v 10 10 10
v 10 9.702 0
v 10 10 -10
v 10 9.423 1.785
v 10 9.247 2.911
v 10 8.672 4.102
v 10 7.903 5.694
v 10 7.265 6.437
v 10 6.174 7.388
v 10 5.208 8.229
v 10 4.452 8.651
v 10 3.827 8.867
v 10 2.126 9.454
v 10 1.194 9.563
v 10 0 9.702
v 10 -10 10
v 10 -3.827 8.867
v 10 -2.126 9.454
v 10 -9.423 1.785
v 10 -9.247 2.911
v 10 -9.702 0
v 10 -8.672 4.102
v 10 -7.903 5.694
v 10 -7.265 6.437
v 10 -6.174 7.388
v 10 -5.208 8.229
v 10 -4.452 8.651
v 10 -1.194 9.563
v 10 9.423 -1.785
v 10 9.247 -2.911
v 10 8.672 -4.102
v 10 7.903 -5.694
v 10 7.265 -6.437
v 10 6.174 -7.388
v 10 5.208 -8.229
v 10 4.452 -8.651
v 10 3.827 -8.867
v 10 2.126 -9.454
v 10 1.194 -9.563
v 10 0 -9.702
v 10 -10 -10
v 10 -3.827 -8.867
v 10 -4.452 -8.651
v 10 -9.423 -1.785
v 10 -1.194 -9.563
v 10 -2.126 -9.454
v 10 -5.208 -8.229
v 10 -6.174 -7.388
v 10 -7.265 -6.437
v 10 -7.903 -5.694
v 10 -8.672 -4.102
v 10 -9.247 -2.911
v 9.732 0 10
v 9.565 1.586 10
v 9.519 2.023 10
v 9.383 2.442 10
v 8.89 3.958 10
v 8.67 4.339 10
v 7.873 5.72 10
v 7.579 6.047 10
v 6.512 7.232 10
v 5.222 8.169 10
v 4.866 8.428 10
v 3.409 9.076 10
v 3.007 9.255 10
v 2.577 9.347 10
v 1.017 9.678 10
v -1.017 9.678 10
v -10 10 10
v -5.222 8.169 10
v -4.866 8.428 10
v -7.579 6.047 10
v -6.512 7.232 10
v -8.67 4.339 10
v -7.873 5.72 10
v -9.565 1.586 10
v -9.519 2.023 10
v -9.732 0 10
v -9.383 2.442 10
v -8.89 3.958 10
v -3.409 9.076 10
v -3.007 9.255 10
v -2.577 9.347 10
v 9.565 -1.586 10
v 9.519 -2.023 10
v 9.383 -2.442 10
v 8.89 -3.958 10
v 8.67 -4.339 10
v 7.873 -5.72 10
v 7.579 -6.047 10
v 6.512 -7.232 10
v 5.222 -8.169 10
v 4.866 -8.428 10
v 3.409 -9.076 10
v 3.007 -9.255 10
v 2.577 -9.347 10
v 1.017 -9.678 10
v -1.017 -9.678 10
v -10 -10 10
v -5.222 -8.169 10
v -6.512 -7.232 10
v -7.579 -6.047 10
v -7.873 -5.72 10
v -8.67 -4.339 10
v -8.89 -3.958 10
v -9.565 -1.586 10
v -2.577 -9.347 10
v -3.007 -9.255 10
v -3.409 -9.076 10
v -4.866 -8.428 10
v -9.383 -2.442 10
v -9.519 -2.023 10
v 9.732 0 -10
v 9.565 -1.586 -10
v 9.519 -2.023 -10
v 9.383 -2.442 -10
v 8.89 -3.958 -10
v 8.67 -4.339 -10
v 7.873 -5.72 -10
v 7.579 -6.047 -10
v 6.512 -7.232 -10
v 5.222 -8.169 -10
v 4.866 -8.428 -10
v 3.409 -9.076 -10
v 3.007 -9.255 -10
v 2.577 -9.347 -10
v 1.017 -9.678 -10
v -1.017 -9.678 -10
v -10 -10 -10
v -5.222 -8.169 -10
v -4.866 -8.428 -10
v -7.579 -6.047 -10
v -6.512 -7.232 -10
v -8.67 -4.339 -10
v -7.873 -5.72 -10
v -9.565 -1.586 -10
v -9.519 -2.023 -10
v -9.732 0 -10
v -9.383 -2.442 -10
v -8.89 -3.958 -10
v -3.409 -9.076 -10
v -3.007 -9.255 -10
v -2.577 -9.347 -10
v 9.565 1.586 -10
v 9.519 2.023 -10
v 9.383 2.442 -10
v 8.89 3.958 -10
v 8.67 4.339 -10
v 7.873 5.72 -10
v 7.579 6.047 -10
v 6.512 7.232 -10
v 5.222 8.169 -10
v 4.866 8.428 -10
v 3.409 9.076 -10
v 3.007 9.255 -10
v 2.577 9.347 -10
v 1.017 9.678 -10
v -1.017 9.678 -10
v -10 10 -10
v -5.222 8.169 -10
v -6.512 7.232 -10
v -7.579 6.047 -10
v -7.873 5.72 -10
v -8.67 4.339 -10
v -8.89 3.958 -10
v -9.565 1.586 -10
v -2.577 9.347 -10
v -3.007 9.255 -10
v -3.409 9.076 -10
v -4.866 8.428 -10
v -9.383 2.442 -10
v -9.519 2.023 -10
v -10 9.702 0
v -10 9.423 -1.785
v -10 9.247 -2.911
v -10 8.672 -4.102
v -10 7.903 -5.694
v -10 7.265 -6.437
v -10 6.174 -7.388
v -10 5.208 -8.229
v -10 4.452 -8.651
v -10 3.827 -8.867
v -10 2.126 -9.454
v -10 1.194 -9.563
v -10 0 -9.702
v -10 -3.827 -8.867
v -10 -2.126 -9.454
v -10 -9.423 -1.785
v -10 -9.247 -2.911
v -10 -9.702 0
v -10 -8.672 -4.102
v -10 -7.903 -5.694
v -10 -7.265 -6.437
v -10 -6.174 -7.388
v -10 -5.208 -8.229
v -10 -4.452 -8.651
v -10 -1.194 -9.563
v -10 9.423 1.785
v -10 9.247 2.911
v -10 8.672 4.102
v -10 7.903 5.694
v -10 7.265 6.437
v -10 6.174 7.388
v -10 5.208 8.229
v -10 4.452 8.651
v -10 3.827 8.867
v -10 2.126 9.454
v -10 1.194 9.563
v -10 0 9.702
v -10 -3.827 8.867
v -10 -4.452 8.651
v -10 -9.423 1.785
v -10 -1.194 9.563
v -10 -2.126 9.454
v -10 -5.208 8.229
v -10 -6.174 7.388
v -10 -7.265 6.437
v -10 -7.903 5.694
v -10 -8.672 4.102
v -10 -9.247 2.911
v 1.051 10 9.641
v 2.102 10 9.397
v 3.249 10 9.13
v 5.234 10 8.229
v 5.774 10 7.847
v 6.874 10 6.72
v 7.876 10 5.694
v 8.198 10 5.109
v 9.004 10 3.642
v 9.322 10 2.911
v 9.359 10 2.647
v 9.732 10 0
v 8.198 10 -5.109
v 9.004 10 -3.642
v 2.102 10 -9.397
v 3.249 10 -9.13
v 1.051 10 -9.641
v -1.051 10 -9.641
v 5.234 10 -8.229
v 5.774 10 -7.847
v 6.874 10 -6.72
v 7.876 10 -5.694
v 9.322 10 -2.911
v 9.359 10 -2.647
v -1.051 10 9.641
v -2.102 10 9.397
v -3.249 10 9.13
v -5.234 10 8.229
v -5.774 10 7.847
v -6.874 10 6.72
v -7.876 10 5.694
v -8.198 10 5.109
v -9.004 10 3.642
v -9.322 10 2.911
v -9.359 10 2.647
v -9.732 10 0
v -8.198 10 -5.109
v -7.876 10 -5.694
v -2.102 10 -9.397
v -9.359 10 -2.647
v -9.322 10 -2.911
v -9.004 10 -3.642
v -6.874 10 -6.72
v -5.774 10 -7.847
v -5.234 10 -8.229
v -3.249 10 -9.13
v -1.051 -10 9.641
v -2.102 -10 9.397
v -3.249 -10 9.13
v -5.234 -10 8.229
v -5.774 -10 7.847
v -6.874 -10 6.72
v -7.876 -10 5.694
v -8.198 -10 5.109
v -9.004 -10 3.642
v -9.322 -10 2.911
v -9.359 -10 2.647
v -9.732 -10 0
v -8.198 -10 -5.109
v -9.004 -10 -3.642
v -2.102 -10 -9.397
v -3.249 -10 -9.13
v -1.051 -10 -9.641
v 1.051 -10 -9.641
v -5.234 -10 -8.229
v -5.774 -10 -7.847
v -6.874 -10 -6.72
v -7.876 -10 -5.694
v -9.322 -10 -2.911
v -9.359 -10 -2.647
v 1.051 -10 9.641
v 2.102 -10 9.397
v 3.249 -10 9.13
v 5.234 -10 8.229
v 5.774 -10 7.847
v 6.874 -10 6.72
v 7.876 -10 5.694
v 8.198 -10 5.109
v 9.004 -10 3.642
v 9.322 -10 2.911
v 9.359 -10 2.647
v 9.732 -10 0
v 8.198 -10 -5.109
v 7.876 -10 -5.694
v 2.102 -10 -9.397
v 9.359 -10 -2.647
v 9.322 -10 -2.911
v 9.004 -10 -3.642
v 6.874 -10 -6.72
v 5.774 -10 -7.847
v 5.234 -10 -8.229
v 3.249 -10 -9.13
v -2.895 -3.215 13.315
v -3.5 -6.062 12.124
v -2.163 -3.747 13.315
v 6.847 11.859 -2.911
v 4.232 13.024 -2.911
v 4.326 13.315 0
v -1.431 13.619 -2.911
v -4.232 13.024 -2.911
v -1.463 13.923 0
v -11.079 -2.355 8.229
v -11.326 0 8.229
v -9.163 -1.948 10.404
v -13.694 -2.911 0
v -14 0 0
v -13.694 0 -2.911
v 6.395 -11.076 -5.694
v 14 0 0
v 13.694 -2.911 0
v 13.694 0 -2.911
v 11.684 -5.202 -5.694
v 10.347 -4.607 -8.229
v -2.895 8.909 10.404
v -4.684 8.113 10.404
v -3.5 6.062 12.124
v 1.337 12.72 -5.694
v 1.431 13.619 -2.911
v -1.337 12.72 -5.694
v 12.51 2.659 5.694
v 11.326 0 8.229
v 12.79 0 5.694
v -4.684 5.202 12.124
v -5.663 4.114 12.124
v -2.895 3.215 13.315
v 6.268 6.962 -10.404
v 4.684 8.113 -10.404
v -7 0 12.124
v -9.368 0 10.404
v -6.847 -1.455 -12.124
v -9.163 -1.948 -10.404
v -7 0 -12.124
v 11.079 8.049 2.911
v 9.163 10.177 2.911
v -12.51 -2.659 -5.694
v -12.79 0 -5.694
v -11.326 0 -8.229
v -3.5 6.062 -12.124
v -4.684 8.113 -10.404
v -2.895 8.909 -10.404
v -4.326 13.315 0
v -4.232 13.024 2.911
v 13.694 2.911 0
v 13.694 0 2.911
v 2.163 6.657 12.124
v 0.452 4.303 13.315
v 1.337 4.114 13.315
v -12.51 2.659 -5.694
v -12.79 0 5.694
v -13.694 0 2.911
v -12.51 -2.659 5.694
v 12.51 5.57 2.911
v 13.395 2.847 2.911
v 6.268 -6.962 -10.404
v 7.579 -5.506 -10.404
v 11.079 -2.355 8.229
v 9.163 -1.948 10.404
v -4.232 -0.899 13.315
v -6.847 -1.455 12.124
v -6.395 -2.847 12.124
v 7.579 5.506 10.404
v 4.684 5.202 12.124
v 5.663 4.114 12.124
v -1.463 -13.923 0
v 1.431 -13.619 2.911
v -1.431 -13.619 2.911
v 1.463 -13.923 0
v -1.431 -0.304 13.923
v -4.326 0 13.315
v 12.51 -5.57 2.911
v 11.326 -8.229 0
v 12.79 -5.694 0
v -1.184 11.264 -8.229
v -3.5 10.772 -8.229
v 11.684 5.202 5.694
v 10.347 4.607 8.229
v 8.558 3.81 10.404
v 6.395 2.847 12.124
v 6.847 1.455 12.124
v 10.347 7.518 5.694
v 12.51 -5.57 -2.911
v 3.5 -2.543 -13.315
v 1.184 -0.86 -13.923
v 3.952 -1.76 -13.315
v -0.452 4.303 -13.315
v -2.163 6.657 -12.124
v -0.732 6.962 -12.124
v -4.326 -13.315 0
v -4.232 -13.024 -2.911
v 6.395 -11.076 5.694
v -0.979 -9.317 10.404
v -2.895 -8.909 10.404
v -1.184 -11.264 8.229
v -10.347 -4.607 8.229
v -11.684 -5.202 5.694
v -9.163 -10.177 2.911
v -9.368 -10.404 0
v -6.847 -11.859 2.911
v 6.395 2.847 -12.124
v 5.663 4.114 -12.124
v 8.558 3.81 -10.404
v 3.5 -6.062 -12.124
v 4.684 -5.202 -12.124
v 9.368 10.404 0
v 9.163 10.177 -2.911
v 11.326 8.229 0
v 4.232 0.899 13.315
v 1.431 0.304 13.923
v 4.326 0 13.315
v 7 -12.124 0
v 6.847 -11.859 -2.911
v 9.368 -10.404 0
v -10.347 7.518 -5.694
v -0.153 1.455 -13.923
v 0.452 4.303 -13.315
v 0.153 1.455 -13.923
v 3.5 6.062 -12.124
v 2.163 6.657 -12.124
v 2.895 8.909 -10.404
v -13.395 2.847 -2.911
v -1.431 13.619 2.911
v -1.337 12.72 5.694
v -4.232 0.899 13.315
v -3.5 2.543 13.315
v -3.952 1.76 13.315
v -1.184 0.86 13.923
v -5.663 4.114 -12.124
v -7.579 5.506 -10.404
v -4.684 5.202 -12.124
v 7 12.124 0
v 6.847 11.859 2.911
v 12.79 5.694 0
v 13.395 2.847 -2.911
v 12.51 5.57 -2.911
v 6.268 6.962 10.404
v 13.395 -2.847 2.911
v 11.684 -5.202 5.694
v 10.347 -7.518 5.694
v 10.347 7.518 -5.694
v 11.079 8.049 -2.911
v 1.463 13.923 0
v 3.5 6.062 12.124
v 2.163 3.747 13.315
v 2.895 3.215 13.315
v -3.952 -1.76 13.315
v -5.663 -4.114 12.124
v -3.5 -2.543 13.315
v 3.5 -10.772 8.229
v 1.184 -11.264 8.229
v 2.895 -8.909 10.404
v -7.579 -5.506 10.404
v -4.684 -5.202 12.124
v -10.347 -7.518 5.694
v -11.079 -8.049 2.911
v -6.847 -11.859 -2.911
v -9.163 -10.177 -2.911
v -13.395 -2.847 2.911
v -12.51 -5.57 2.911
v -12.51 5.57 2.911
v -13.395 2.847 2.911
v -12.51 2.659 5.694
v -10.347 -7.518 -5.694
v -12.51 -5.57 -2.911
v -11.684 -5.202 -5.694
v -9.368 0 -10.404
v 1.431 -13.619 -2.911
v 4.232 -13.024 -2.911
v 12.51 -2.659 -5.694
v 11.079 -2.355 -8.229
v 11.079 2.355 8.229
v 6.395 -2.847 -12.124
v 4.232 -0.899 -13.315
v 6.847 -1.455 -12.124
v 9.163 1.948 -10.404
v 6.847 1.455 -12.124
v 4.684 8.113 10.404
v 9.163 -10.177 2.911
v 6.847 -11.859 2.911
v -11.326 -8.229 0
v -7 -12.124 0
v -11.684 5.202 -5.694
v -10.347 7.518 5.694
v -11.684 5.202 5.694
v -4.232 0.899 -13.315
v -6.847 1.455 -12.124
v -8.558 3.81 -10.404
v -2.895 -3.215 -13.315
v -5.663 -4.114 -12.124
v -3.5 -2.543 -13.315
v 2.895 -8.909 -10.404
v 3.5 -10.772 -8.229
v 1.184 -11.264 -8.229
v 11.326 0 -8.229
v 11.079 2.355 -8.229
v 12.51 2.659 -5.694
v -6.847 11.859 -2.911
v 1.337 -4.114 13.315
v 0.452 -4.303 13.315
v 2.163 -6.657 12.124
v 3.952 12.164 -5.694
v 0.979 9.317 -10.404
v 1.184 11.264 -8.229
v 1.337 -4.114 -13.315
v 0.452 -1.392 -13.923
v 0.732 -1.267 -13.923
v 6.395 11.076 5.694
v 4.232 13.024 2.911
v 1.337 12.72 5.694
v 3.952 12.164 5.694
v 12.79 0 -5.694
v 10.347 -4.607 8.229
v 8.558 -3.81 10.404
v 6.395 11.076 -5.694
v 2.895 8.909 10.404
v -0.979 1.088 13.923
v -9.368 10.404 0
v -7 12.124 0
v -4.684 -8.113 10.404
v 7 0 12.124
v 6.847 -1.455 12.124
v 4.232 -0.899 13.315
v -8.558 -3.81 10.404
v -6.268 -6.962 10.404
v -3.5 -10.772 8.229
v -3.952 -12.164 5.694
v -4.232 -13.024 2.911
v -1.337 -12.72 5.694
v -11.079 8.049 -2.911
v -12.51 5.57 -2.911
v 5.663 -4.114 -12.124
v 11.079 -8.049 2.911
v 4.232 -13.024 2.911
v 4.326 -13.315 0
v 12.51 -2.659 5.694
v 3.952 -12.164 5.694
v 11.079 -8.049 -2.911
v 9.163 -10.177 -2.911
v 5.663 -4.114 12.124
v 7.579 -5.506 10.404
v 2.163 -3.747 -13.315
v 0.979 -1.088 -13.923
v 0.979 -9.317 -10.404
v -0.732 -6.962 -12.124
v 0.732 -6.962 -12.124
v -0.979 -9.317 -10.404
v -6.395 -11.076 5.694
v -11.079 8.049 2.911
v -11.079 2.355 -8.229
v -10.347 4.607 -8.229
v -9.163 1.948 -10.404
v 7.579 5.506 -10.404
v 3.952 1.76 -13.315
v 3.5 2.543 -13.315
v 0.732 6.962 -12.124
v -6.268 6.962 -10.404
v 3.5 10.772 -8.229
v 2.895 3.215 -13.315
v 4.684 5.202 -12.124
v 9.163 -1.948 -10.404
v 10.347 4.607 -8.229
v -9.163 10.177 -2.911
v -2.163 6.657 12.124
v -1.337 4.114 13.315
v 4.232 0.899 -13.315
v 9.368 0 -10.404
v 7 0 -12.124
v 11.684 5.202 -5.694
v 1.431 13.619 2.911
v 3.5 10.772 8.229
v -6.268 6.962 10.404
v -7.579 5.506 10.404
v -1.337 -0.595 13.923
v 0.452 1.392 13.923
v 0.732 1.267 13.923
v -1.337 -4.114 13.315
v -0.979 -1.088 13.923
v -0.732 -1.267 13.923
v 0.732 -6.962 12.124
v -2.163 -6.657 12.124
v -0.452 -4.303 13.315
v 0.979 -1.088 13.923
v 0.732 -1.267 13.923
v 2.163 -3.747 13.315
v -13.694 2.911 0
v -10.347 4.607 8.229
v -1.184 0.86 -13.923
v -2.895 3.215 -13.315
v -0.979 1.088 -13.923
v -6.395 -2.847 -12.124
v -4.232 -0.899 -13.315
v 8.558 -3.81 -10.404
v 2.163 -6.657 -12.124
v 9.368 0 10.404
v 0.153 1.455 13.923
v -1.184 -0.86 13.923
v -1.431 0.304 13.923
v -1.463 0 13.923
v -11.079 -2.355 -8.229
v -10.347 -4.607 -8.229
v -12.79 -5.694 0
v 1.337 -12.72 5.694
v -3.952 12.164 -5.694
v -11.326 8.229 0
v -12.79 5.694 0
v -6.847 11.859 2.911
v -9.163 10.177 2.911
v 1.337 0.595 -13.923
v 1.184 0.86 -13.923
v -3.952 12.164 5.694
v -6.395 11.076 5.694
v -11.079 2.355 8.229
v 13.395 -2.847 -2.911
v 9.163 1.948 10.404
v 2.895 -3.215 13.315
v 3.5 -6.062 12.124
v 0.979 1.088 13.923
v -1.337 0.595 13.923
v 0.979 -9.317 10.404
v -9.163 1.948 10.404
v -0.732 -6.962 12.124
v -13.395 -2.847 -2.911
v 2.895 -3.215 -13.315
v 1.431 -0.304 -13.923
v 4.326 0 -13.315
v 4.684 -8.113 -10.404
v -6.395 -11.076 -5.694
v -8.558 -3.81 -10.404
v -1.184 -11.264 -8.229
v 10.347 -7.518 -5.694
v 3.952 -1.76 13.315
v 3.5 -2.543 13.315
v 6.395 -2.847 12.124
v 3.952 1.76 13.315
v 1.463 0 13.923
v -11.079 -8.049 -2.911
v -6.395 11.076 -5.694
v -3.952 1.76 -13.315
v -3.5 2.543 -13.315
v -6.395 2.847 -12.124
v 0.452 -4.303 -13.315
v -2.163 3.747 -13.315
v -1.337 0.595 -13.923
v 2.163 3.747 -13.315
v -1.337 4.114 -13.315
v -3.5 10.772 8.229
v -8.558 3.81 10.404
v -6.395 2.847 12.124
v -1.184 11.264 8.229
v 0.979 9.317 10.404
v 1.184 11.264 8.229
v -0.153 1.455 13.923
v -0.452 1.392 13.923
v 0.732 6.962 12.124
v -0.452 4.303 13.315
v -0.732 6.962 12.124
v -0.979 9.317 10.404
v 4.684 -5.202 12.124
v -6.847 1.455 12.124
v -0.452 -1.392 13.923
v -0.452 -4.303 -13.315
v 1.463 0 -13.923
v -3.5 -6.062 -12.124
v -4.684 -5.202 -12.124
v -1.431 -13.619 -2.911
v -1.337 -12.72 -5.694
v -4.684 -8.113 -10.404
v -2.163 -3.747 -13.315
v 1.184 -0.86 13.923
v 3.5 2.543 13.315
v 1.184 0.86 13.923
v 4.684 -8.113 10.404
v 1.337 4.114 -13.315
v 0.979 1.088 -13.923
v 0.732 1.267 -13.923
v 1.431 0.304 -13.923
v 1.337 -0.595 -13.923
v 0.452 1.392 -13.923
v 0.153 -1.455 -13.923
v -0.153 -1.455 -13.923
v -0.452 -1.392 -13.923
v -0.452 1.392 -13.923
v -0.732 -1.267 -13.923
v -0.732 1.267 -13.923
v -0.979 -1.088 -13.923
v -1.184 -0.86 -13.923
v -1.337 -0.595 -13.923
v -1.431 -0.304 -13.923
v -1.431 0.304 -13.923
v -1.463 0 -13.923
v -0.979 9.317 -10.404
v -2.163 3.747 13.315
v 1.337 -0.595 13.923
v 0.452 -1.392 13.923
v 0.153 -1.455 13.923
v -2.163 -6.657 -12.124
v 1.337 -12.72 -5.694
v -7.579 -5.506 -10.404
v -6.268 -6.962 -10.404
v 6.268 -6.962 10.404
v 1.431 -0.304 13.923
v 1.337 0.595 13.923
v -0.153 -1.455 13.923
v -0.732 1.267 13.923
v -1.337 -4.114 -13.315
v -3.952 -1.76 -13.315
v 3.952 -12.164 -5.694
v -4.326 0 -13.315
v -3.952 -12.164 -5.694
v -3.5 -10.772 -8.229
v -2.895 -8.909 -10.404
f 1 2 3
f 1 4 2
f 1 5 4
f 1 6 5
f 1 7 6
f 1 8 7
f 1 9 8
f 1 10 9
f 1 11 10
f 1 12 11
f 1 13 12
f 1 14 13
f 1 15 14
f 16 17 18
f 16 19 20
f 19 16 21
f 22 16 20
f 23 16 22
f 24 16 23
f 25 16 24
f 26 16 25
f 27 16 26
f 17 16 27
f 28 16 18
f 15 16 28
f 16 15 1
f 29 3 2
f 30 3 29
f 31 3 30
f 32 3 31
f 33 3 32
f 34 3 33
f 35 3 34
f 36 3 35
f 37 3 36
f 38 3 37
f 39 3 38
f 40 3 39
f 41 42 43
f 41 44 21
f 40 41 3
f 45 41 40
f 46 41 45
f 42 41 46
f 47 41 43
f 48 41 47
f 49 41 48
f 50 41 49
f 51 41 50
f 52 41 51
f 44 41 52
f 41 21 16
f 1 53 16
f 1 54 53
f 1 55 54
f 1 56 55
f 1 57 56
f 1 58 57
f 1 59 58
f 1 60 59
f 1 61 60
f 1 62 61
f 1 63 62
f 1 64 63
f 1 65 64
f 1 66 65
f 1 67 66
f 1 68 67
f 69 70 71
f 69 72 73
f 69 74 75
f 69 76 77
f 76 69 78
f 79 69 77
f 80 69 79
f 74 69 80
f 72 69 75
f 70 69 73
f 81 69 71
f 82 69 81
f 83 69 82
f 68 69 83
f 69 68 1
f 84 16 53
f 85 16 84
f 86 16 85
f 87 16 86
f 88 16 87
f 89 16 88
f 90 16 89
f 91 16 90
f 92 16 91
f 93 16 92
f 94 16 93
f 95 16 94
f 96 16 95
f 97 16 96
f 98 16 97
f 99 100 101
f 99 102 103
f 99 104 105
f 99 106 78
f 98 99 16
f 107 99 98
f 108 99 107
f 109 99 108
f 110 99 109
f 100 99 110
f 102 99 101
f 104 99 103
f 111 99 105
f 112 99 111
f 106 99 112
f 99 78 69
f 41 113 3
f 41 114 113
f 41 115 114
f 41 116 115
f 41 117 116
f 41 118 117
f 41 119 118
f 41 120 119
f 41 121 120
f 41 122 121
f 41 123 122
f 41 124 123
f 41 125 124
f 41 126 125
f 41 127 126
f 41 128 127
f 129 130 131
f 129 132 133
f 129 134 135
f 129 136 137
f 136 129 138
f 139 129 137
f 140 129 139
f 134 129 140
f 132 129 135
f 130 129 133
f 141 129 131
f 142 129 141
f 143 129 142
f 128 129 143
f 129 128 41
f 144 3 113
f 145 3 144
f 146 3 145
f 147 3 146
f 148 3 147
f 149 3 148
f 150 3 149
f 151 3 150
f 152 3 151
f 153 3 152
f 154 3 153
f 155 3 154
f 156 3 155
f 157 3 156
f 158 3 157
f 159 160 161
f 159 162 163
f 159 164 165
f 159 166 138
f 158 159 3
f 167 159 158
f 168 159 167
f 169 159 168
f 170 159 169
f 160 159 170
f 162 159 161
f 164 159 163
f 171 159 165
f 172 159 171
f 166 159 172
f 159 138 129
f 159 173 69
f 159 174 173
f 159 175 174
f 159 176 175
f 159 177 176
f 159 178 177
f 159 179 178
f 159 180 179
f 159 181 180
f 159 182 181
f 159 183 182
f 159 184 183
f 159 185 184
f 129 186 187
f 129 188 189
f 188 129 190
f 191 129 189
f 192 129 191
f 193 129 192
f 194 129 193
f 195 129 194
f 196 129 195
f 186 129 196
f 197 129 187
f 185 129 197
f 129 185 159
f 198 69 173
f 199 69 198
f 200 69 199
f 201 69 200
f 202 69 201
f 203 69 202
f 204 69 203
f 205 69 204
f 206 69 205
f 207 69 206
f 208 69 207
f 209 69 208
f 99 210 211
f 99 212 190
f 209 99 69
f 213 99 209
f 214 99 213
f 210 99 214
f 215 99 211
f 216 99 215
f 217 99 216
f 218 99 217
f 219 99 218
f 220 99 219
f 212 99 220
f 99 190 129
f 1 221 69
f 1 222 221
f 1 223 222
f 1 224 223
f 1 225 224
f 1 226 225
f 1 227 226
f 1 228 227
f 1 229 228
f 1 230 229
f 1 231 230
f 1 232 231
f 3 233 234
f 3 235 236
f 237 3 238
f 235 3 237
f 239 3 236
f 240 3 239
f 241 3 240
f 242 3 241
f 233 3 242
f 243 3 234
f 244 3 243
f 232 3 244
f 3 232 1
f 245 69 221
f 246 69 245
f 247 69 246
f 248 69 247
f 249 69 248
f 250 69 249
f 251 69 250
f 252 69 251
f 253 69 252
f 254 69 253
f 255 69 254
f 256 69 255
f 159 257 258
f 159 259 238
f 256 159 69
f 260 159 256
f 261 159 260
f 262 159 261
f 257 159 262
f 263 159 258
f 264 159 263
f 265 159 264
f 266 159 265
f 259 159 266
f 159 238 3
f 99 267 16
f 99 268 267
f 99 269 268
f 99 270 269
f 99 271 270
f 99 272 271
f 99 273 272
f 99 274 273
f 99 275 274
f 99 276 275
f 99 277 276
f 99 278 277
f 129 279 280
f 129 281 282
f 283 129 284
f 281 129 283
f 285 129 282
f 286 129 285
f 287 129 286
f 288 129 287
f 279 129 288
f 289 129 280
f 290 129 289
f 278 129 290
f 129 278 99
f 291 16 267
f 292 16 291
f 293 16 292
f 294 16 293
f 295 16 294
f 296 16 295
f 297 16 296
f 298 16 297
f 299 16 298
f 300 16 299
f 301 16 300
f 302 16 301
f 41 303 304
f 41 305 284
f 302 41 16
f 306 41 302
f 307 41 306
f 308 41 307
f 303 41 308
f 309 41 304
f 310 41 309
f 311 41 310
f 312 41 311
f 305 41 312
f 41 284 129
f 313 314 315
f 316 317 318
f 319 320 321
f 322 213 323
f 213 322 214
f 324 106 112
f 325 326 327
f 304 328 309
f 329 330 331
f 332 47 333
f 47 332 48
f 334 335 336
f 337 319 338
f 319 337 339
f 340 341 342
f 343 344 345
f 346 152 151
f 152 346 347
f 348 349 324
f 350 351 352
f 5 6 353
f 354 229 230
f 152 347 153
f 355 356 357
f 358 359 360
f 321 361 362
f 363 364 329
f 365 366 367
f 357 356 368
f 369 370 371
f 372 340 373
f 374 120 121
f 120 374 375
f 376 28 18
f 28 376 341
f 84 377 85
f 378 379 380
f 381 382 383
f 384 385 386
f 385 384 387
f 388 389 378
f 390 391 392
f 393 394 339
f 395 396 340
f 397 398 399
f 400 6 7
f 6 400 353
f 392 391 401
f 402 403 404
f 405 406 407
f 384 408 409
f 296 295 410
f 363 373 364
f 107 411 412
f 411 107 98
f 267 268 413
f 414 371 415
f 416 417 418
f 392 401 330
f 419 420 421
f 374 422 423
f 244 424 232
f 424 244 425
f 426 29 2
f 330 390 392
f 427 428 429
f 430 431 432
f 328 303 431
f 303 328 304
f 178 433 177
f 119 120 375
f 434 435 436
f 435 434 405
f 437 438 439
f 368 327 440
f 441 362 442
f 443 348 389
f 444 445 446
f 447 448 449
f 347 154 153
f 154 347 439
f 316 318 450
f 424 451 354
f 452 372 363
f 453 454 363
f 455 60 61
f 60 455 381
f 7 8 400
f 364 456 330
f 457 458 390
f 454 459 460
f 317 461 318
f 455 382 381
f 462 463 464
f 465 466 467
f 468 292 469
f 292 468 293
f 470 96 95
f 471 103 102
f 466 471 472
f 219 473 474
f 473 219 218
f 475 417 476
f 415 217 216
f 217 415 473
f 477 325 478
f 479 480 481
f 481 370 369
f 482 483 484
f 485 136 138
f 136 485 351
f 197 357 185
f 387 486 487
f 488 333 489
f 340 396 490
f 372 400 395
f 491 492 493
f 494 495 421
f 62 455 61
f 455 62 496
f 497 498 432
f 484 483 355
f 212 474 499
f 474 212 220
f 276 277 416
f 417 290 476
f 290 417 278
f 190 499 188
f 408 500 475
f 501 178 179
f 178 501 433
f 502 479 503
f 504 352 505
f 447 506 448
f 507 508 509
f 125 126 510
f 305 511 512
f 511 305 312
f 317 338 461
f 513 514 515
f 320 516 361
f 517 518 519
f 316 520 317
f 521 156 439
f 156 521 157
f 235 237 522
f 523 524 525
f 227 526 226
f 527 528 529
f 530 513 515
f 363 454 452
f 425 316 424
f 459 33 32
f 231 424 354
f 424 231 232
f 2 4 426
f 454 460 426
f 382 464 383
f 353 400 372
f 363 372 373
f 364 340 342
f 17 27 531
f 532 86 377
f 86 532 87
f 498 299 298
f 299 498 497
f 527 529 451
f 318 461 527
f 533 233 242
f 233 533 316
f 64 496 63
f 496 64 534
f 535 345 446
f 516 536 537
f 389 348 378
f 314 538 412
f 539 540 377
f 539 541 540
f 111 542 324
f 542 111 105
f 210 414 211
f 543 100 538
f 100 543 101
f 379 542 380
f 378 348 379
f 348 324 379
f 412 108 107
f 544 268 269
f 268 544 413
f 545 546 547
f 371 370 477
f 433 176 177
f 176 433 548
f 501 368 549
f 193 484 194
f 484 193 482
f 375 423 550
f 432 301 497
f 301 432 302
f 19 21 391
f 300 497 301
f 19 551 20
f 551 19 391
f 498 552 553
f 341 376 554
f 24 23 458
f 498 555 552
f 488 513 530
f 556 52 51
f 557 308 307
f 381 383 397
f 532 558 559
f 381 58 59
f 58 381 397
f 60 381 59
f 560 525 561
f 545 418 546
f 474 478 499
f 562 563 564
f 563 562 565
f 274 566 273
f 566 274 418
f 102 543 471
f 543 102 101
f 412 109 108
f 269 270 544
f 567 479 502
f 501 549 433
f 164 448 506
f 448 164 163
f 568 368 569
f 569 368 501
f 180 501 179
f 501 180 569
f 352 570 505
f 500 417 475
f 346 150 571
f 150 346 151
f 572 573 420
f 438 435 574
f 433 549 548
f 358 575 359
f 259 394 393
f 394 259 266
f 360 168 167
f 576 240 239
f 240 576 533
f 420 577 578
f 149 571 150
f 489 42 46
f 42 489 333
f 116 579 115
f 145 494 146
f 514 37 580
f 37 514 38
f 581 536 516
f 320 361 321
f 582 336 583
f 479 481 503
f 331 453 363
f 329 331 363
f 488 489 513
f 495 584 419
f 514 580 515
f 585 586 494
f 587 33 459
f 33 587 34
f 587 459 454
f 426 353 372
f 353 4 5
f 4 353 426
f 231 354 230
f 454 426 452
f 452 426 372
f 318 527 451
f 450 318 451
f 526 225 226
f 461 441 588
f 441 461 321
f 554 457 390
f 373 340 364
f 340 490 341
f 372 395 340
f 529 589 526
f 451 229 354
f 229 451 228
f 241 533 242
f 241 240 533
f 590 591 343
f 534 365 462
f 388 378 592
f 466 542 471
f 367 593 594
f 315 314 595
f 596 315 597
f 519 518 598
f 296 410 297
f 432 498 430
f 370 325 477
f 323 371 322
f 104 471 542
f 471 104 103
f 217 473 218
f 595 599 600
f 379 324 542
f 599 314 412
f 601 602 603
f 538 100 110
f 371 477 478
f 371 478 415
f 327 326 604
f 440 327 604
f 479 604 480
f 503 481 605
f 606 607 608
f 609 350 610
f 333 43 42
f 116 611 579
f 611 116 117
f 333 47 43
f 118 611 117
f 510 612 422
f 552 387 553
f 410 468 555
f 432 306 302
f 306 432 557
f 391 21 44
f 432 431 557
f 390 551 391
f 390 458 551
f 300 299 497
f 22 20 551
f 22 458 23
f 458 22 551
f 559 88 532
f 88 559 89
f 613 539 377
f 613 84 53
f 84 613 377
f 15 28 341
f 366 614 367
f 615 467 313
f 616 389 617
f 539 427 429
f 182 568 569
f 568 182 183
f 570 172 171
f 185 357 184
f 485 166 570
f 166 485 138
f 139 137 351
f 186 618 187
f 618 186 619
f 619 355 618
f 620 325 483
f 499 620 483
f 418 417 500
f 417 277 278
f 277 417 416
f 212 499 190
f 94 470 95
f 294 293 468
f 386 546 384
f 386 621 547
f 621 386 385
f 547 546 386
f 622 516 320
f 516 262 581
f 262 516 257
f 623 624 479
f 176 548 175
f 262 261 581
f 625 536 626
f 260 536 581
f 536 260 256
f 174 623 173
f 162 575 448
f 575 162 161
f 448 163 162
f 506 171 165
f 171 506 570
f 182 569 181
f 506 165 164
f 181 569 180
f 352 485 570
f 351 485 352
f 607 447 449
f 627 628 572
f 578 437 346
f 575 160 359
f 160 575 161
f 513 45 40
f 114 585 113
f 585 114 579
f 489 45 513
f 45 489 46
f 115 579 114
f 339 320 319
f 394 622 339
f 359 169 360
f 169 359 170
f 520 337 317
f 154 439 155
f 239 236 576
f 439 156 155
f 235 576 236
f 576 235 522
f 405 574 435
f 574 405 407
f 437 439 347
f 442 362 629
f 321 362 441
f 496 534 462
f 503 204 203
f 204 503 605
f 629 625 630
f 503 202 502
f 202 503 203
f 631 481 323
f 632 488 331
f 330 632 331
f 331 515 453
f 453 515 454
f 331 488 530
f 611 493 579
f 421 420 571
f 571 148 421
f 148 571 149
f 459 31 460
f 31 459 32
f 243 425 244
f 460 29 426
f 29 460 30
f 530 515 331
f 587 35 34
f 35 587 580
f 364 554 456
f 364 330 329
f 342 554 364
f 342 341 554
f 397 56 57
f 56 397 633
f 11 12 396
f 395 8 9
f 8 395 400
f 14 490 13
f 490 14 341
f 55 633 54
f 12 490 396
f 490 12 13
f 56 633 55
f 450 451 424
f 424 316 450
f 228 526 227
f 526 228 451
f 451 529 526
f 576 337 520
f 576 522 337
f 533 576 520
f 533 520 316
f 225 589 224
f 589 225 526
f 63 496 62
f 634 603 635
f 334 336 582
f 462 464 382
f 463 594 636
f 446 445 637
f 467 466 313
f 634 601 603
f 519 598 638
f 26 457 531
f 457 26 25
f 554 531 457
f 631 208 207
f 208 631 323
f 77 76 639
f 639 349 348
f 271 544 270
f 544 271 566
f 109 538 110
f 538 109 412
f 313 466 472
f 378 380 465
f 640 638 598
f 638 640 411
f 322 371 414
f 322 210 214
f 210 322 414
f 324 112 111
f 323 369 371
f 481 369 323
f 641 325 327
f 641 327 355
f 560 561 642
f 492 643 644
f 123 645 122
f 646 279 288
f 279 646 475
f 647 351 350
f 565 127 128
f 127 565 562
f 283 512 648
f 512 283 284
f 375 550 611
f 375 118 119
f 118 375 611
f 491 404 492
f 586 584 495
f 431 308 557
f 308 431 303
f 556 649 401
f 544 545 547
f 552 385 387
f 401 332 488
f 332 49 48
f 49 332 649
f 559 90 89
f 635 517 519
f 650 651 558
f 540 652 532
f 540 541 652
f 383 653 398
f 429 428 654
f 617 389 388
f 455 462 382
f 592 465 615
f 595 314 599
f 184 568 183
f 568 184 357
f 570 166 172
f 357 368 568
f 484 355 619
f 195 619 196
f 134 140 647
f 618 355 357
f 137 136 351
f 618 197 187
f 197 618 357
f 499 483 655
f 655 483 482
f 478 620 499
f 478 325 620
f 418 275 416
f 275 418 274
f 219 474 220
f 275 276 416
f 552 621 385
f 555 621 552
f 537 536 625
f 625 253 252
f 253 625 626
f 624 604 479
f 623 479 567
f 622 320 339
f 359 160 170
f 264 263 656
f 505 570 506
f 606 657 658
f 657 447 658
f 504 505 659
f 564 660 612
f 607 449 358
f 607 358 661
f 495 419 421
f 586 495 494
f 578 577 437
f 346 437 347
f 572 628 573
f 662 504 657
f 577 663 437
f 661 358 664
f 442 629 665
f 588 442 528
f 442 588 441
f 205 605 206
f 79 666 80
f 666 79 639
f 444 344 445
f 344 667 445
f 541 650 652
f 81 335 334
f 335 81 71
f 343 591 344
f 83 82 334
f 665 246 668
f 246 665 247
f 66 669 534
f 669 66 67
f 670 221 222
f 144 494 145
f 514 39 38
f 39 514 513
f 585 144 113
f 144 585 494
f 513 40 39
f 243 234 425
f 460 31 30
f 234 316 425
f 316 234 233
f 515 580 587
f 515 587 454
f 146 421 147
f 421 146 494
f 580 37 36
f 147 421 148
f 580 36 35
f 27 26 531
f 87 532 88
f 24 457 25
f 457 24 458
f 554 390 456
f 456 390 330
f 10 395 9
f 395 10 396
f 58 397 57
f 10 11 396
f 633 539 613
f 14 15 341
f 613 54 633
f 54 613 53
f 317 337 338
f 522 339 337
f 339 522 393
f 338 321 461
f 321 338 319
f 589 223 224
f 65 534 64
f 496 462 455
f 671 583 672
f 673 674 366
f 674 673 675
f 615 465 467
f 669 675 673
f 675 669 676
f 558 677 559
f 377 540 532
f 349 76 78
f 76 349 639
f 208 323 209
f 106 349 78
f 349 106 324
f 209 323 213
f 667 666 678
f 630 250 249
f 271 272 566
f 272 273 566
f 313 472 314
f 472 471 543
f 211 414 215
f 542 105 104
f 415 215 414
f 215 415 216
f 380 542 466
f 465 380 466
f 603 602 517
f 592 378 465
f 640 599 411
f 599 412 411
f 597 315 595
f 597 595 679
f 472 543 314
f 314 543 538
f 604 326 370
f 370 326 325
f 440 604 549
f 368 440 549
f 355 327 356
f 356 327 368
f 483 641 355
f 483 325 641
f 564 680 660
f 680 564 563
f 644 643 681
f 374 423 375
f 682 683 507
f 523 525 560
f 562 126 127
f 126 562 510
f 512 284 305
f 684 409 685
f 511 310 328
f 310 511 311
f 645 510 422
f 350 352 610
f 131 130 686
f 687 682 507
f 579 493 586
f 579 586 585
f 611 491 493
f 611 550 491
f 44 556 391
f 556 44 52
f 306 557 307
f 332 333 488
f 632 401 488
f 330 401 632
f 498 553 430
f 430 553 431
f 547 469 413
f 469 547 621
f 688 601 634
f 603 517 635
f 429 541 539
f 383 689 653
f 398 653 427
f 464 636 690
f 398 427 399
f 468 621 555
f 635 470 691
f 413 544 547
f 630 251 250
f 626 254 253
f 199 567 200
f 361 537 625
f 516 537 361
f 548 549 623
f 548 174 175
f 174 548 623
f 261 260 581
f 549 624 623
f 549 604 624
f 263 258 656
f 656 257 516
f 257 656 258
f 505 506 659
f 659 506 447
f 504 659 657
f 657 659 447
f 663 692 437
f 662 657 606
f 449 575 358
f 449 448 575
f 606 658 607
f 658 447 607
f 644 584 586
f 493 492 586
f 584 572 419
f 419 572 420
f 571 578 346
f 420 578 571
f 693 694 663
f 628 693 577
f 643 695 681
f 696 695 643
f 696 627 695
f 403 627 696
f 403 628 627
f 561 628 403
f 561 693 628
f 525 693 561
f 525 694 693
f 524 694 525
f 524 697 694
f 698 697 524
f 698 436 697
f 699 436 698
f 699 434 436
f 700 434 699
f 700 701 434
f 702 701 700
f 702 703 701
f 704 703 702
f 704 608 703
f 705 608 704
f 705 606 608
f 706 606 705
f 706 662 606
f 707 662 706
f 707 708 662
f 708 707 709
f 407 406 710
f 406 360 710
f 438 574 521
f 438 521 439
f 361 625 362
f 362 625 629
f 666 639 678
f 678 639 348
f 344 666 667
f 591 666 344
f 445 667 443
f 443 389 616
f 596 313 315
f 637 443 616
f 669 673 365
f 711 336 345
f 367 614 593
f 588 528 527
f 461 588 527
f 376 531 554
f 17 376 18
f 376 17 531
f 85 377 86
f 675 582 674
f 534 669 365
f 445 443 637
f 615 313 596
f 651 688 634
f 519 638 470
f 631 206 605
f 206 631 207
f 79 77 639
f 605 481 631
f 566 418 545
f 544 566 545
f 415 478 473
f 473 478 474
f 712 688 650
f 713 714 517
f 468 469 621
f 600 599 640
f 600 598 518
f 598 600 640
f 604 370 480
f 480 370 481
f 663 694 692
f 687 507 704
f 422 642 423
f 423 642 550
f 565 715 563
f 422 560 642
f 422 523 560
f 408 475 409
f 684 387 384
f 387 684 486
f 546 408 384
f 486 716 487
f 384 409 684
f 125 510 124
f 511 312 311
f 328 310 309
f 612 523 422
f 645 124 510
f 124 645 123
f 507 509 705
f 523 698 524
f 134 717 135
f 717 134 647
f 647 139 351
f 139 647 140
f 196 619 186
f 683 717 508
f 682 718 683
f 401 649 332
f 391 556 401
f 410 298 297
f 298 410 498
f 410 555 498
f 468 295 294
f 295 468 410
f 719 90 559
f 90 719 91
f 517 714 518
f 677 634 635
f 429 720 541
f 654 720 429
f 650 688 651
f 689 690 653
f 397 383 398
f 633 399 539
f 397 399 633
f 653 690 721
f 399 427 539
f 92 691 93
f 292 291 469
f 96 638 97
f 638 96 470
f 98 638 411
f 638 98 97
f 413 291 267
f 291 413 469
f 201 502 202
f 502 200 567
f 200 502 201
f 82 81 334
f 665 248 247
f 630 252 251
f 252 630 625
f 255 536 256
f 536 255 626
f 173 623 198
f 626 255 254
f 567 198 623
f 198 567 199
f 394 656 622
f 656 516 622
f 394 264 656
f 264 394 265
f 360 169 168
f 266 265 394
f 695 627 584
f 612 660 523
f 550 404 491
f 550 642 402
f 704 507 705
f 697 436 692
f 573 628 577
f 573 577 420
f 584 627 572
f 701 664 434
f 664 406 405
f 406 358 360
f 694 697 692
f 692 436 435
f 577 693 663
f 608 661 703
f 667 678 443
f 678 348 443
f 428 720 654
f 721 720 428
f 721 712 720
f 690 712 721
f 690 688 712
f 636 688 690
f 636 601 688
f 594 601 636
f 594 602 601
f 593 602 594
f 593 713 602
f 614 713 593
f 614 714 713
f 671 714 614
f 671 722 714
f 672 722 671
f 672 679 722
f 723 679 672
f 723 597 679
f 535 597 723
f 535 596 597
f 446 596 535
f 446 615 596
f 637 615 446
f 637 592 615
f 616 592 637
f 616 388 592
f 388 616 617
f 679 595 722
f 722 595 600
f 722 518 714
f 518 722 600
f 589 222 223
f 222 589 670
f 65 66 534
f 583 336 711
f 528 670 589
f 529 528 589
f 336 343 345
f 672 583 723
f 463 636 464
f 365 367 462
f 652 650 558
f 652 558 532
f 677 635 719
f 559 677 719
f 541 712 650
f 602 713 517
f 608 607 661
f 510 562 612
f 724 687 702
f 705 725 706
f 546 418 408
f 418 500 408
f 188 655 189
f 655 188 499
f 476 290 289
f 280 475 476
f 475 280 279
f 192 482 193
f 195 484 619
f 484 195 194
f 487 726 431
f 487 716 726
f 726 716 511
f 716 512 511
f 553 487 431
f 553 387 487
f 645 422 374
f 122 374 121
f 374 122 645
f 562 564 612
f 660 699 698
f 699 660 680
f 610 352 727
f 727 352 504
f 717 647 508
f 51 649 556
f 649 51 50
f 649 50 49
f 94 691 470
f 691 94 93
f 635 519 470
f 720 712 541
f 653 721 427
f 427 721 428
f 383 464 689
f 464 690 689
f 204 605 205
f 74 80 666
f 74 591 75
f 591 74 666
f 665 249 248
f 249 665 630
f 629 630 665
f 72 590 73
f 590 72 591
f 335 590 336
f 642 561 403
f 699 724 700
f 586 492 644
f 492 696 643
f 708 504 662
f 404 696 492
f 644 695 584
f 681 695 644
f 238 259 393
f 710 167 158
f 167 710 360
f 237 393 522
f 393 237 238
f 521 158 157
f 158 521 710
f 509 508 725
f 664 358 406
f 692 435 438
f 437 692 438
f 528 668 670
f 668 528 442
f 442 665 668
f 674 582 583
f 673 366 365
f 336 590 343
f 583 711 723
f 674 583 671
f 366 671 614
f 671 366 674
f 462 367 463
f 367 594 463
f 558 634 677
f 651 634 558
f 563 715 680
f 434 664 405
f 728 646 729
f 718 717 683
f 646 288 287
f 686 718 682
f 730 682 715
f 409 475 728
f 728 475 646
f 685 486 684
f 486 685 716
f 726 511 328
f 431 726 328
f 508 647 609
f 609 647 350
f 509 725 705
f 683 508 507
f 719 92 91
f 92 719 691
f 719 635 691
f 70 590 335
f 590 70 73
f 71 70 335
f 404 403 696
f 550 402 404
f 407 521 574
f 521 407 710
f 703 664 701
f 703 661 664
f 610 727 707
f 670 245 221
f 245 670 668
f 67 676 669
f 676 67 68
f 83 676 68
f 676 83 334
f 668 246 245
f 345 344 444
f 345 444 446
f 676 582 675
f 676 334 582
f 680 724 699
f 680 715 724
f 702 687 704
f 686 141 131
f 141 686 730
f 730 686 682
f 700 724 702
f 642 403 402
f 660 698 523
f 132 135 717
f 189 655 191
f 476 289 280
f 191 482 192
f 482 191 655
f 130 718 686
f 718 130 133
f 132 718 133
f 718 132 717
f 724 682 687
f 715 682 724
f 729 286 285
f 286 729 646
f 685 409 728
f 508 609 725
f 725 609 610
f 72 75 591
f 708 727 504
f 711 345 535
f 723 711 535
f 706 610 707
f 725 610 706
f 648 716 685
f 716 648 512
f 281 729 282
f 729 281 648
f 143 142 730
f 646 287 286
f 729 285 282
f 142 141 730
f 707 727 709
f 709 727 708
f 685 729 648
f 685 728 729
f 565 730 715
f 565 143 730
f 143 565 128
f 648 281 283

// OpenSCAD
union() {
  color([1,0,0]) cube([20,20,20], center=true);
  color([0,0,1]) sphere(14);
}
